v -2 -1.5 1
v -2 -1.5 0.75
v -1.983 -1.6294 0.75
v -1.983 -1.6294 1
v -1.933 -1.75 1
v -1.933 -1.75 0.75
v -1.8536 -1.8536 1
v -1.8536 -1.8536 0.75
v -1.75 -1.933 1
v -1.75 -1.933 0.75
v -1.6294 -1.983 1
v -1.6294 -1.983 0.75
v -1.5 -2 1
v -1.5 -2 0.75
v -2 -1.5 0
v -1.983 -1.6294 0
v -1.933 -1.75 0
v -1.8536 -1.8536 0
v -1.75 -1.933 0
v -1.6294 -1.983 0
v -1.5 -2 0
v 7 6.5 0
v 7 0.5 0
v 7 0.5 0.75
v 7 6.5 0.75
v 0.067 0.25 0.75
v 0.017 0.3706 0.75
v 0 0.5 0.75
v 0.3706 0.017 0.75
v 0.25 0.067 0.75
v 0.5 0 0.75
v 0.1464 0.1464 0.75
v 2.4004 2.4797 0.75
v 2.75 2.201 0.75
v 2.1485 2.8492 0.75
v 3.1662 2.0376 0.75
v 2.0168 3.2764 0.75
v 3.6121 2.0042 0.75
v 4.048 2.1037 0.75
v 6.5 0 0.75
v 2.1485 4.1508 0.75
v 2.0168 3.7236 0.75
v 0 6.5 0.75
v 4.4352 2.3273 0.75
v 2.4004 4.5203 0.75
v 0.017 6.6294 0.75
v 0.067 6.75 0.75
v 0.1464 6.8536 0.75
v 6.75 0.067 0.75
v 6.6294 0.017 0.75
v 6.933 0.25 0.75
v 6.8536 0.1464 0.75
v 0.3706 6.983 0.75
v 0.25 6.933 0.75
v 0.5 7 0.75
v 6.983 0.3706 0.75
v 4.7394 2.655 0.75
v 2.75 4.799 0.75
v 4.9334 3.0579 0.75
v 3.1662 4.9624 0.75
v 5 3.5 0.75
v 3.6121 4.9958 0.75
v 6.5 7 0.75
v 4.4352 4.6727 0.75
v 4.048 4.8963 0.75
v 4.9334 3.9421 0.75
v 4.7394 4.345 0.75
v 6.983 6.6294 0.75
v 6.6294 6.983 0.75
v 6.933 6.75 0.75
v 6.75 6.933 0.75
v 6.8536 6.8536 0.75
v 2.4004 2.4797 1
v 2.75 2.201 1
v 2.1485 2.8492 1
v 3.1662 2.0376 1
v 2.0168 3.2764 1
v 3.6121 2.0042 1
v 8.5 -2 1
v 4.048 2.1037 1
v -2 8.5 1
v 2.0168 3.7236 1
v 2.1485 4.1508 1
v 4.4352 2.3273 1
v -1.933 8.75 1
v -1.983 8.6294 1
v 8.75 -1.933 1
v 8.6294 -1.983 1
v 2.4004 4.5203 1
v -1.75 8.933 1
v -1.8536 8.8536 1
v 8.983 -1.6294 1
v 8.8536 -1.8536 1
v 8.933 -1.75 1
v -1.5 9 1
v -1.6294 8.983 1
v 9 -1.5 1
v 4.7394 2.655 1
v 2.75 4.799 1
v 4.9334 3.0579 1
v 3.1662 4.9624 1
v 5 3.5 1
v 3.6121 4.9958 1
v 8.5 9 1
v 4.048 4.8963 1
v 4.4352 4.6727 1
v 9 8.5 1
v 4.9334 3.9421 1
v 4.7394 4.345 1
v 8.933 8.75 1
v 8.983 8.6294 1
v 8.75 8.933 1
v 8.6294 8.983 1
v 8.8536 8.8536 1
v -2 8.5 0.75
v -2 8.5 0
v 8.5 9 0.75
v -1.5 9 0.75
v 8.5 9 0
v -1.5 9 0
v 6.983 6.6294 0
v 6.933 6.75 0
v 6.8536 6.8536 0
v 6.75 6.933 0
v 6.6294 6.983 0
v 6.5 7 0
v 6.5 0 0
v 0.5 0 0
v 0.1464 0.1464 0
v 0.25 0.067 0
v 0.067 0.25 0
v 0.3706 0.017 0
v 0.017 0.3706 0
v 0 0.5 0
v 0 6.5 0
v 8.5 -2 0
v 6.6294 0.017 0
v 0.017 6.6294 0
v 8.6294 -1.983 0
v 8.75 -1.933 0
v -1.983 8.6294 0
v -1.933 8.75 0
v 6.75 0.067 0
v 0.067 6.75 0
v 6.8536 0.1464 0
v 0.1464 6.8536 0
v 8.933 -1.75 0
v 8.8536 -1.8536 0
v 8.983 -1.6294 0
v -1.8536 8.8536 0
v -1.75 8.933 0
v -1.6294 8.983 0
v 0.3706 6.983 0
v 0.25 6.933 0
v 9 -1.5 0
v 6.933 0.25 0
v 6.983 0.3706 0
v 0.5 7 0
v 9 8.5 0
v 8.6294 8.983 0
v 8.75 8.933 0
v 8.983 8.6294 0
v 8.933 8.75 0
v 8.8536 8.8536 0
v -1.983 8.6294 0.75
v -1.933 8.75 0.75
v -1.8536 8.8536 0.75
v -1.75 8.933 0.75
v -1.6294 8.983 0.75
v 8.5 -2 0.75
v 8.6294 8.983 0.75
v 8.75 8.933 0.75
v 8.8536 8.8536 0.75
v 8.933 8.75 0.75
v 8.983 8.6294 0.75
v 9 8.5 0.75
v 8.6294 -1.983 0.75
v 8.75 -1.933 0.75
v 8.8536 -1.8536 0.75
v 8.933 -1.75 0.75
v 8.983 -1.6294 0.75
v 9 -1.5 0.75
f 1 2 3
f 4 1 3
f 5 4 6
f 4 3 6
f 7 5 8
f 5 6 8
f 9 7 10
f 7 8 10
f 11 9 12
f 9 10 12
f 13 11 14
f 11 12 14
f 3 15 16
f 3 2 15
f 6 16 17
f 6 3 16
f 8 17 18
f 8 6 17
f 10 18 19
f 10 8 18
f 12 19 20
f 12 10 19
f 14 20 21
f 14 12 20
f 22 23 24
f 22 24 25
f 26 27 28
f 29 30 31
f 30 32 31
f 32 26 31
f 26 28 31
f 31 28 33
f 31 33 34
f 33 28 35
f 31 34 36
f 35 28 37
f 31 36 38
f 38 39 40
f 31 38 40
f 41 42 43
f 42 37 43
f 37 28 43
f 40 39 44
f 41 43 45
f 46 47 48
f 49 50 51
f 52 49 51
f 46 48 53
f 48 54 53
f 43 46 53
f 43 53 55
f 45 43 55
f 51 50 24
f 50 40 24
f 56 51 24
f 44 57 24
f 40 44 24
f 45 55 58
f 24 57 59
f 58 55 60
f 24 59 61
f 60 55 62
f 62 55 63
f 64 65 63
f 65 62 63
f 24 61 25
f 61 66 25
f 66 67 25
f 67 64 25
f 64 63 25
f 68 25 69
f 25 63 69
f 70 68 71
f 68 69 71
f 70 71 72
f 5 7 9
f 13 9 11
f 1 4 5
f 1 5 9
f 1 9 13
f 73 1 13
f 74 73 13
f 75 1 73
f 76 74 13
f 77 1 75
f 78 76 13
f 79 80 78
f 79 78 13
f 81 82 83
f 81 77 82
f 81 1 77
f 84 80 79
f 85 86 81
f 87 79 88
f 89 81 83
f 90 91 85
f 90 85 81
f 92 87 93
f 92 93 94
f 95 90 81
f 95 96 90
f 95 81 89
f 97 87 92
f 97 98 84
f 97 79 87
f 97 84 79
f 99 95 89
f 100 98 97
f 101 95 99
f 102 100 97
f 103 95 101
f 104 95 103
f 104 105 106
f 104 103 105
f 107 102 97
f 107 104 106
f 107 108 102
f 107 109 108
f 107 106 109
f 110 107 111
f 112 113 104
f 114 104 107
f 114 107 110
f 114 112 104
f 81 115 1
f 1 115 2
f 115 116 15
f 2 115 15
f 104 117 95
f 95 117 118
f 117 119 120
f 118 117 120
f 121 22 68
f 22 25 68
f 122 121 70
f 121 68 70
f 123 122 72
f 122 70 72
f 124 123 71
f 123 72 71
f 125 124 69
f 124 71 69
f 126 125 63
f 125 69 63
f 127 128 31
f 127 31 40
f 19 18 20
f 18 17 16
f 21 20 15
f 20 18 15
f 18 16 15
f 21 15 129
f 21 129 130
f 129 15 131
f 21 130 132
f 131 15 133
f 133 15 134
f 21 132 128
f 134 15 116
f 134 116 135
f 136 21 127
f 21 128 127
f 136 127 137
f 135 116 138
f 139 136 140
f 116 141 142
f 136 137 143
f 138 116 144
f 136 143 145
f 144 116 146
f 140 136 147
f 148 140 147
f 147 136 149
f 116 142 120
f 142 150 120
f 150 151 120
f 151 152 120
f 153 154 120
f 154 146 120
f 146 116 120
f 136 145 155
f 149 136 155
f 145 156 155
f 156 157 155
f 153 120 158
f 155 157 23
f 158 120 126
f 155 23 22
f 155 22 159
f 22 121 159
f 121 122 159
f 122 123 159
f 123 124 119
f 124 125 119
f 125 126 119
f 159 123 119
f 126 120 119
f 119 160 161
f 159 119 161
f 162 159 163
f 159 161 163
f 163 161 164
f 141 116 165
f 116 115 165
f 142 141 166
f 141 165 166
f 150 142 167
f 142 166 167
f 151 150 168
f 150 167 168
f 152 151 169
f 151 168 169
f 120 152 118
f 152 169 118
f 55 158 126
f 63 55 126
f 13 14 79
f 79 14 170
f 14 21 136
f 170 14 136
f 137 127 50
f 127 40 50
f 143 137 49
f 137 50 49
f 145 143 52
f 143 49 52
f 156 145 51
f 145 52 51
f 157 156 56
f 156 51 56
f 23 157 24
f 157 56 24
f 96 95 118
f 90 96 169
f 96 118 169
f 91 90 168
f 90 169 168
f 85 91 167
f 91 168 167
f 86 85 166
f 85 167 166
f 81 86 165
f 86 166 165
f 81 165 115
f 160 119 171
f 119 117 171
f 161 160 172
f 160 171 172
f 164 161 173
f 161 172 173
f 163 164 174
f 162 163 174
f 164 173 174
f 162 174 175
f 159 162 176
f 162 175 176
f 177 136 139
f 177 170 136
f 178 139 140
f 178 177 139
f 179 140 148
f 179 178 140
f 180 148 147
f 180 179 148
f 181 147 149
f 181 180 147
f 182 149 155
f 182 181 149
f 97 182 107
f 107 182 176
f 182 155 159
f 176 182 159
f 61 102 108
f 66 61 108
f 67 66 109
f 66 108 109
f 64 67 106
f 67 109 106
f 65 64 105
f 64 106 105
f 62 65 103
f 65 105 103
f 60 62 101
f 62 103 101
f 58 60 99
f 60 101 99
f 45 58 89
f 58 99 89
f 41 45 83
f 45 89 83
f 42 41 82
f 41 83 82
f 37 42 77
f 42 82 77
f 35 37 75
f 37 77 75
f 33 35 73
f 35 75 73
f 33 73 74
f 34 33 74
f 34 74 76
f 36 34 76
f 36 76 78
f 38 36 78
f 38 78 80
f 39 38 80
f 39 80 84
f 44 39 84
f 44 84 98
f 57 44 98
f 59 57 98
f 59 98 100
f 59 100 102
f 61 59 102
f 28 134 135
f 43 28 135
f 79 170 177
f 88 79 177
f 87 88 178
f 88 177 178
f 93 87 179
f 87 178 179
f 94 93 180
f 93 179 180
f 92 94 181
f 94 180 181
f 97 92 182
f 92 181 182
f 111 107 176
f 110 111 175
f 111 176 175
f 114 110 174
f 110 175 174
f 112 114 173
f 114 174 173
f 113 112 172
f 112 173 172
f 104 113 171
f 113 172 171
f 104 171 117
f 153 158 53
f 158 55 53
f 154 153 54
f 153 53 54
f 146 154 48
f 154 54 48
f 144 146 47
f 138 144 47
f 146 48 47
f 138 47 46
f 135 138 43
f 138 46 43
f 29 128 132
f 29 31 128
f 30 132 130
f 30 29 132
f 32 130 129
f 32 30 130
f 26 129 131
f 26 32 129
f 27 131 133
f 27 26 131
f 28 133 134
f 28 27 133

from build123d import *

# Parameters (mm, degrees)
F0_W     = 11
F0_H     = 11
F0_W_2   = 7
F0_H_2   = 7
F1_DEPTH = 0.75
F2_R     = 0.5
F4_DEPTH = 0.25
F5_R     = 1.5
F6_DEPTH = 1.001


with BuildPart() as f1:
    # F0 (on Top) → F1 (new body)
    with BuildSketch(Plane.XY):
        with Locations((3.5, 3.5)):
            Rectangle(F0_W, F0_H)
        with Locations((3.5, 3.5)):
            Rectangle(F0_W_2, F0_H_2, mode=Mode.SUBTRACT)
    extrude(amount=F1_DEPTH)

    # F2
    f2_edges = [f1.edges().sort_by_distance(p)[0] for p in [
        (0, 7, 0.375),
        (7, 7, 0.375),
        (9, 9, 0.375),
        (-2, 9, 0.375),
        (-2, -2, 0.375),
        (9, -2, 0.375),
        (0, 0, 0.375),
        (7, 0, 0.375),
    ]]
    fillet(f2_edges, radius=F2_R)

    # F3 (on face) → F4 (join)
    with BuildSketch(Plane.XY.offset(0.75)):
        with BuildLine():
            ThreePointArc((-2, -1.5), (-1.8535533906, -1.8535533906), (-1.5, -2))
            Line((-1.5, -2), (8.5, -2))
            ThreePointArc((8.5, -2), (8.8535533906, -1.8535533906), (9, -1.5))
            Line((9, -1.5), (9, 8.5))
            ThreePointArc((9, 8.5), (8.8535533906, 8.8535533906), (8.5, 9))
            Line((8.5, 9), (-1.5, 9))
            ThreePointArc((-1.5, 9), (-1.8535533906, 8.8535533906), (-2, 8.5))
            Line((-2, 8.5), (-2, -1.5))
        make_face()
        with BuildLine():
            ThreePointArc((7, 0.5), (6.8535533906, 0.1464466094), (6.5, 0))
            Line((6.5, 0), (0.5, 0))
            ThreePointArc((0.5, 0), (0.1464466094, 0.1464466094), (0, 0.5))
            Line((0, 0.5), (0, 6.5))
            ThreePointArc((0, 6.5), (0.1464466094, 6.8535533906), (0.5, 7))
            Line((0.5, 7), (6.5, 7))
            ThreePointArc((6.5, 7), (6.8535533906, 6.8535533906), (7, 6.5))
            Line((7, 6.5), (7, 0.5))
        make_face(mode=Mode.SUBTRACT)
        with BuildLine():
            Line((0.5, 0), (6.5, 0))
            ThreePointArc((6.5, 0), (6.8535533906, 0.1464466094), (7, 0.5))
            Line((7, 0.5), (7, 6.5))
            ThreePointArc((7, 6.5), (6.8535533906, 6.8535533906), (6.5, 7))
            Line((6.5, 7), (0.5, 7))
            ThreePointArc((0.5, 7), (0.1464466094, 6.8535533906), (0, 6.5))
            Line((0, 6.5), (0, 0.5))
            ThreePointArc((0, 0.5), (0.1464466094, 0.1464466094), (0.5, 0))
        make_face()
    extrude(amount=F4_DEPTH)

    # F5 (on face) → F6 (cut, through all)
    with BuildSketch(Plane.XY.offset(1)):
        with Locations((3.5, 3.5)):
            Circle(F5_R)
    extrude(amount=-F6_DEPTH, mode=Mode.SUBTRACT)


solid = f1.part
